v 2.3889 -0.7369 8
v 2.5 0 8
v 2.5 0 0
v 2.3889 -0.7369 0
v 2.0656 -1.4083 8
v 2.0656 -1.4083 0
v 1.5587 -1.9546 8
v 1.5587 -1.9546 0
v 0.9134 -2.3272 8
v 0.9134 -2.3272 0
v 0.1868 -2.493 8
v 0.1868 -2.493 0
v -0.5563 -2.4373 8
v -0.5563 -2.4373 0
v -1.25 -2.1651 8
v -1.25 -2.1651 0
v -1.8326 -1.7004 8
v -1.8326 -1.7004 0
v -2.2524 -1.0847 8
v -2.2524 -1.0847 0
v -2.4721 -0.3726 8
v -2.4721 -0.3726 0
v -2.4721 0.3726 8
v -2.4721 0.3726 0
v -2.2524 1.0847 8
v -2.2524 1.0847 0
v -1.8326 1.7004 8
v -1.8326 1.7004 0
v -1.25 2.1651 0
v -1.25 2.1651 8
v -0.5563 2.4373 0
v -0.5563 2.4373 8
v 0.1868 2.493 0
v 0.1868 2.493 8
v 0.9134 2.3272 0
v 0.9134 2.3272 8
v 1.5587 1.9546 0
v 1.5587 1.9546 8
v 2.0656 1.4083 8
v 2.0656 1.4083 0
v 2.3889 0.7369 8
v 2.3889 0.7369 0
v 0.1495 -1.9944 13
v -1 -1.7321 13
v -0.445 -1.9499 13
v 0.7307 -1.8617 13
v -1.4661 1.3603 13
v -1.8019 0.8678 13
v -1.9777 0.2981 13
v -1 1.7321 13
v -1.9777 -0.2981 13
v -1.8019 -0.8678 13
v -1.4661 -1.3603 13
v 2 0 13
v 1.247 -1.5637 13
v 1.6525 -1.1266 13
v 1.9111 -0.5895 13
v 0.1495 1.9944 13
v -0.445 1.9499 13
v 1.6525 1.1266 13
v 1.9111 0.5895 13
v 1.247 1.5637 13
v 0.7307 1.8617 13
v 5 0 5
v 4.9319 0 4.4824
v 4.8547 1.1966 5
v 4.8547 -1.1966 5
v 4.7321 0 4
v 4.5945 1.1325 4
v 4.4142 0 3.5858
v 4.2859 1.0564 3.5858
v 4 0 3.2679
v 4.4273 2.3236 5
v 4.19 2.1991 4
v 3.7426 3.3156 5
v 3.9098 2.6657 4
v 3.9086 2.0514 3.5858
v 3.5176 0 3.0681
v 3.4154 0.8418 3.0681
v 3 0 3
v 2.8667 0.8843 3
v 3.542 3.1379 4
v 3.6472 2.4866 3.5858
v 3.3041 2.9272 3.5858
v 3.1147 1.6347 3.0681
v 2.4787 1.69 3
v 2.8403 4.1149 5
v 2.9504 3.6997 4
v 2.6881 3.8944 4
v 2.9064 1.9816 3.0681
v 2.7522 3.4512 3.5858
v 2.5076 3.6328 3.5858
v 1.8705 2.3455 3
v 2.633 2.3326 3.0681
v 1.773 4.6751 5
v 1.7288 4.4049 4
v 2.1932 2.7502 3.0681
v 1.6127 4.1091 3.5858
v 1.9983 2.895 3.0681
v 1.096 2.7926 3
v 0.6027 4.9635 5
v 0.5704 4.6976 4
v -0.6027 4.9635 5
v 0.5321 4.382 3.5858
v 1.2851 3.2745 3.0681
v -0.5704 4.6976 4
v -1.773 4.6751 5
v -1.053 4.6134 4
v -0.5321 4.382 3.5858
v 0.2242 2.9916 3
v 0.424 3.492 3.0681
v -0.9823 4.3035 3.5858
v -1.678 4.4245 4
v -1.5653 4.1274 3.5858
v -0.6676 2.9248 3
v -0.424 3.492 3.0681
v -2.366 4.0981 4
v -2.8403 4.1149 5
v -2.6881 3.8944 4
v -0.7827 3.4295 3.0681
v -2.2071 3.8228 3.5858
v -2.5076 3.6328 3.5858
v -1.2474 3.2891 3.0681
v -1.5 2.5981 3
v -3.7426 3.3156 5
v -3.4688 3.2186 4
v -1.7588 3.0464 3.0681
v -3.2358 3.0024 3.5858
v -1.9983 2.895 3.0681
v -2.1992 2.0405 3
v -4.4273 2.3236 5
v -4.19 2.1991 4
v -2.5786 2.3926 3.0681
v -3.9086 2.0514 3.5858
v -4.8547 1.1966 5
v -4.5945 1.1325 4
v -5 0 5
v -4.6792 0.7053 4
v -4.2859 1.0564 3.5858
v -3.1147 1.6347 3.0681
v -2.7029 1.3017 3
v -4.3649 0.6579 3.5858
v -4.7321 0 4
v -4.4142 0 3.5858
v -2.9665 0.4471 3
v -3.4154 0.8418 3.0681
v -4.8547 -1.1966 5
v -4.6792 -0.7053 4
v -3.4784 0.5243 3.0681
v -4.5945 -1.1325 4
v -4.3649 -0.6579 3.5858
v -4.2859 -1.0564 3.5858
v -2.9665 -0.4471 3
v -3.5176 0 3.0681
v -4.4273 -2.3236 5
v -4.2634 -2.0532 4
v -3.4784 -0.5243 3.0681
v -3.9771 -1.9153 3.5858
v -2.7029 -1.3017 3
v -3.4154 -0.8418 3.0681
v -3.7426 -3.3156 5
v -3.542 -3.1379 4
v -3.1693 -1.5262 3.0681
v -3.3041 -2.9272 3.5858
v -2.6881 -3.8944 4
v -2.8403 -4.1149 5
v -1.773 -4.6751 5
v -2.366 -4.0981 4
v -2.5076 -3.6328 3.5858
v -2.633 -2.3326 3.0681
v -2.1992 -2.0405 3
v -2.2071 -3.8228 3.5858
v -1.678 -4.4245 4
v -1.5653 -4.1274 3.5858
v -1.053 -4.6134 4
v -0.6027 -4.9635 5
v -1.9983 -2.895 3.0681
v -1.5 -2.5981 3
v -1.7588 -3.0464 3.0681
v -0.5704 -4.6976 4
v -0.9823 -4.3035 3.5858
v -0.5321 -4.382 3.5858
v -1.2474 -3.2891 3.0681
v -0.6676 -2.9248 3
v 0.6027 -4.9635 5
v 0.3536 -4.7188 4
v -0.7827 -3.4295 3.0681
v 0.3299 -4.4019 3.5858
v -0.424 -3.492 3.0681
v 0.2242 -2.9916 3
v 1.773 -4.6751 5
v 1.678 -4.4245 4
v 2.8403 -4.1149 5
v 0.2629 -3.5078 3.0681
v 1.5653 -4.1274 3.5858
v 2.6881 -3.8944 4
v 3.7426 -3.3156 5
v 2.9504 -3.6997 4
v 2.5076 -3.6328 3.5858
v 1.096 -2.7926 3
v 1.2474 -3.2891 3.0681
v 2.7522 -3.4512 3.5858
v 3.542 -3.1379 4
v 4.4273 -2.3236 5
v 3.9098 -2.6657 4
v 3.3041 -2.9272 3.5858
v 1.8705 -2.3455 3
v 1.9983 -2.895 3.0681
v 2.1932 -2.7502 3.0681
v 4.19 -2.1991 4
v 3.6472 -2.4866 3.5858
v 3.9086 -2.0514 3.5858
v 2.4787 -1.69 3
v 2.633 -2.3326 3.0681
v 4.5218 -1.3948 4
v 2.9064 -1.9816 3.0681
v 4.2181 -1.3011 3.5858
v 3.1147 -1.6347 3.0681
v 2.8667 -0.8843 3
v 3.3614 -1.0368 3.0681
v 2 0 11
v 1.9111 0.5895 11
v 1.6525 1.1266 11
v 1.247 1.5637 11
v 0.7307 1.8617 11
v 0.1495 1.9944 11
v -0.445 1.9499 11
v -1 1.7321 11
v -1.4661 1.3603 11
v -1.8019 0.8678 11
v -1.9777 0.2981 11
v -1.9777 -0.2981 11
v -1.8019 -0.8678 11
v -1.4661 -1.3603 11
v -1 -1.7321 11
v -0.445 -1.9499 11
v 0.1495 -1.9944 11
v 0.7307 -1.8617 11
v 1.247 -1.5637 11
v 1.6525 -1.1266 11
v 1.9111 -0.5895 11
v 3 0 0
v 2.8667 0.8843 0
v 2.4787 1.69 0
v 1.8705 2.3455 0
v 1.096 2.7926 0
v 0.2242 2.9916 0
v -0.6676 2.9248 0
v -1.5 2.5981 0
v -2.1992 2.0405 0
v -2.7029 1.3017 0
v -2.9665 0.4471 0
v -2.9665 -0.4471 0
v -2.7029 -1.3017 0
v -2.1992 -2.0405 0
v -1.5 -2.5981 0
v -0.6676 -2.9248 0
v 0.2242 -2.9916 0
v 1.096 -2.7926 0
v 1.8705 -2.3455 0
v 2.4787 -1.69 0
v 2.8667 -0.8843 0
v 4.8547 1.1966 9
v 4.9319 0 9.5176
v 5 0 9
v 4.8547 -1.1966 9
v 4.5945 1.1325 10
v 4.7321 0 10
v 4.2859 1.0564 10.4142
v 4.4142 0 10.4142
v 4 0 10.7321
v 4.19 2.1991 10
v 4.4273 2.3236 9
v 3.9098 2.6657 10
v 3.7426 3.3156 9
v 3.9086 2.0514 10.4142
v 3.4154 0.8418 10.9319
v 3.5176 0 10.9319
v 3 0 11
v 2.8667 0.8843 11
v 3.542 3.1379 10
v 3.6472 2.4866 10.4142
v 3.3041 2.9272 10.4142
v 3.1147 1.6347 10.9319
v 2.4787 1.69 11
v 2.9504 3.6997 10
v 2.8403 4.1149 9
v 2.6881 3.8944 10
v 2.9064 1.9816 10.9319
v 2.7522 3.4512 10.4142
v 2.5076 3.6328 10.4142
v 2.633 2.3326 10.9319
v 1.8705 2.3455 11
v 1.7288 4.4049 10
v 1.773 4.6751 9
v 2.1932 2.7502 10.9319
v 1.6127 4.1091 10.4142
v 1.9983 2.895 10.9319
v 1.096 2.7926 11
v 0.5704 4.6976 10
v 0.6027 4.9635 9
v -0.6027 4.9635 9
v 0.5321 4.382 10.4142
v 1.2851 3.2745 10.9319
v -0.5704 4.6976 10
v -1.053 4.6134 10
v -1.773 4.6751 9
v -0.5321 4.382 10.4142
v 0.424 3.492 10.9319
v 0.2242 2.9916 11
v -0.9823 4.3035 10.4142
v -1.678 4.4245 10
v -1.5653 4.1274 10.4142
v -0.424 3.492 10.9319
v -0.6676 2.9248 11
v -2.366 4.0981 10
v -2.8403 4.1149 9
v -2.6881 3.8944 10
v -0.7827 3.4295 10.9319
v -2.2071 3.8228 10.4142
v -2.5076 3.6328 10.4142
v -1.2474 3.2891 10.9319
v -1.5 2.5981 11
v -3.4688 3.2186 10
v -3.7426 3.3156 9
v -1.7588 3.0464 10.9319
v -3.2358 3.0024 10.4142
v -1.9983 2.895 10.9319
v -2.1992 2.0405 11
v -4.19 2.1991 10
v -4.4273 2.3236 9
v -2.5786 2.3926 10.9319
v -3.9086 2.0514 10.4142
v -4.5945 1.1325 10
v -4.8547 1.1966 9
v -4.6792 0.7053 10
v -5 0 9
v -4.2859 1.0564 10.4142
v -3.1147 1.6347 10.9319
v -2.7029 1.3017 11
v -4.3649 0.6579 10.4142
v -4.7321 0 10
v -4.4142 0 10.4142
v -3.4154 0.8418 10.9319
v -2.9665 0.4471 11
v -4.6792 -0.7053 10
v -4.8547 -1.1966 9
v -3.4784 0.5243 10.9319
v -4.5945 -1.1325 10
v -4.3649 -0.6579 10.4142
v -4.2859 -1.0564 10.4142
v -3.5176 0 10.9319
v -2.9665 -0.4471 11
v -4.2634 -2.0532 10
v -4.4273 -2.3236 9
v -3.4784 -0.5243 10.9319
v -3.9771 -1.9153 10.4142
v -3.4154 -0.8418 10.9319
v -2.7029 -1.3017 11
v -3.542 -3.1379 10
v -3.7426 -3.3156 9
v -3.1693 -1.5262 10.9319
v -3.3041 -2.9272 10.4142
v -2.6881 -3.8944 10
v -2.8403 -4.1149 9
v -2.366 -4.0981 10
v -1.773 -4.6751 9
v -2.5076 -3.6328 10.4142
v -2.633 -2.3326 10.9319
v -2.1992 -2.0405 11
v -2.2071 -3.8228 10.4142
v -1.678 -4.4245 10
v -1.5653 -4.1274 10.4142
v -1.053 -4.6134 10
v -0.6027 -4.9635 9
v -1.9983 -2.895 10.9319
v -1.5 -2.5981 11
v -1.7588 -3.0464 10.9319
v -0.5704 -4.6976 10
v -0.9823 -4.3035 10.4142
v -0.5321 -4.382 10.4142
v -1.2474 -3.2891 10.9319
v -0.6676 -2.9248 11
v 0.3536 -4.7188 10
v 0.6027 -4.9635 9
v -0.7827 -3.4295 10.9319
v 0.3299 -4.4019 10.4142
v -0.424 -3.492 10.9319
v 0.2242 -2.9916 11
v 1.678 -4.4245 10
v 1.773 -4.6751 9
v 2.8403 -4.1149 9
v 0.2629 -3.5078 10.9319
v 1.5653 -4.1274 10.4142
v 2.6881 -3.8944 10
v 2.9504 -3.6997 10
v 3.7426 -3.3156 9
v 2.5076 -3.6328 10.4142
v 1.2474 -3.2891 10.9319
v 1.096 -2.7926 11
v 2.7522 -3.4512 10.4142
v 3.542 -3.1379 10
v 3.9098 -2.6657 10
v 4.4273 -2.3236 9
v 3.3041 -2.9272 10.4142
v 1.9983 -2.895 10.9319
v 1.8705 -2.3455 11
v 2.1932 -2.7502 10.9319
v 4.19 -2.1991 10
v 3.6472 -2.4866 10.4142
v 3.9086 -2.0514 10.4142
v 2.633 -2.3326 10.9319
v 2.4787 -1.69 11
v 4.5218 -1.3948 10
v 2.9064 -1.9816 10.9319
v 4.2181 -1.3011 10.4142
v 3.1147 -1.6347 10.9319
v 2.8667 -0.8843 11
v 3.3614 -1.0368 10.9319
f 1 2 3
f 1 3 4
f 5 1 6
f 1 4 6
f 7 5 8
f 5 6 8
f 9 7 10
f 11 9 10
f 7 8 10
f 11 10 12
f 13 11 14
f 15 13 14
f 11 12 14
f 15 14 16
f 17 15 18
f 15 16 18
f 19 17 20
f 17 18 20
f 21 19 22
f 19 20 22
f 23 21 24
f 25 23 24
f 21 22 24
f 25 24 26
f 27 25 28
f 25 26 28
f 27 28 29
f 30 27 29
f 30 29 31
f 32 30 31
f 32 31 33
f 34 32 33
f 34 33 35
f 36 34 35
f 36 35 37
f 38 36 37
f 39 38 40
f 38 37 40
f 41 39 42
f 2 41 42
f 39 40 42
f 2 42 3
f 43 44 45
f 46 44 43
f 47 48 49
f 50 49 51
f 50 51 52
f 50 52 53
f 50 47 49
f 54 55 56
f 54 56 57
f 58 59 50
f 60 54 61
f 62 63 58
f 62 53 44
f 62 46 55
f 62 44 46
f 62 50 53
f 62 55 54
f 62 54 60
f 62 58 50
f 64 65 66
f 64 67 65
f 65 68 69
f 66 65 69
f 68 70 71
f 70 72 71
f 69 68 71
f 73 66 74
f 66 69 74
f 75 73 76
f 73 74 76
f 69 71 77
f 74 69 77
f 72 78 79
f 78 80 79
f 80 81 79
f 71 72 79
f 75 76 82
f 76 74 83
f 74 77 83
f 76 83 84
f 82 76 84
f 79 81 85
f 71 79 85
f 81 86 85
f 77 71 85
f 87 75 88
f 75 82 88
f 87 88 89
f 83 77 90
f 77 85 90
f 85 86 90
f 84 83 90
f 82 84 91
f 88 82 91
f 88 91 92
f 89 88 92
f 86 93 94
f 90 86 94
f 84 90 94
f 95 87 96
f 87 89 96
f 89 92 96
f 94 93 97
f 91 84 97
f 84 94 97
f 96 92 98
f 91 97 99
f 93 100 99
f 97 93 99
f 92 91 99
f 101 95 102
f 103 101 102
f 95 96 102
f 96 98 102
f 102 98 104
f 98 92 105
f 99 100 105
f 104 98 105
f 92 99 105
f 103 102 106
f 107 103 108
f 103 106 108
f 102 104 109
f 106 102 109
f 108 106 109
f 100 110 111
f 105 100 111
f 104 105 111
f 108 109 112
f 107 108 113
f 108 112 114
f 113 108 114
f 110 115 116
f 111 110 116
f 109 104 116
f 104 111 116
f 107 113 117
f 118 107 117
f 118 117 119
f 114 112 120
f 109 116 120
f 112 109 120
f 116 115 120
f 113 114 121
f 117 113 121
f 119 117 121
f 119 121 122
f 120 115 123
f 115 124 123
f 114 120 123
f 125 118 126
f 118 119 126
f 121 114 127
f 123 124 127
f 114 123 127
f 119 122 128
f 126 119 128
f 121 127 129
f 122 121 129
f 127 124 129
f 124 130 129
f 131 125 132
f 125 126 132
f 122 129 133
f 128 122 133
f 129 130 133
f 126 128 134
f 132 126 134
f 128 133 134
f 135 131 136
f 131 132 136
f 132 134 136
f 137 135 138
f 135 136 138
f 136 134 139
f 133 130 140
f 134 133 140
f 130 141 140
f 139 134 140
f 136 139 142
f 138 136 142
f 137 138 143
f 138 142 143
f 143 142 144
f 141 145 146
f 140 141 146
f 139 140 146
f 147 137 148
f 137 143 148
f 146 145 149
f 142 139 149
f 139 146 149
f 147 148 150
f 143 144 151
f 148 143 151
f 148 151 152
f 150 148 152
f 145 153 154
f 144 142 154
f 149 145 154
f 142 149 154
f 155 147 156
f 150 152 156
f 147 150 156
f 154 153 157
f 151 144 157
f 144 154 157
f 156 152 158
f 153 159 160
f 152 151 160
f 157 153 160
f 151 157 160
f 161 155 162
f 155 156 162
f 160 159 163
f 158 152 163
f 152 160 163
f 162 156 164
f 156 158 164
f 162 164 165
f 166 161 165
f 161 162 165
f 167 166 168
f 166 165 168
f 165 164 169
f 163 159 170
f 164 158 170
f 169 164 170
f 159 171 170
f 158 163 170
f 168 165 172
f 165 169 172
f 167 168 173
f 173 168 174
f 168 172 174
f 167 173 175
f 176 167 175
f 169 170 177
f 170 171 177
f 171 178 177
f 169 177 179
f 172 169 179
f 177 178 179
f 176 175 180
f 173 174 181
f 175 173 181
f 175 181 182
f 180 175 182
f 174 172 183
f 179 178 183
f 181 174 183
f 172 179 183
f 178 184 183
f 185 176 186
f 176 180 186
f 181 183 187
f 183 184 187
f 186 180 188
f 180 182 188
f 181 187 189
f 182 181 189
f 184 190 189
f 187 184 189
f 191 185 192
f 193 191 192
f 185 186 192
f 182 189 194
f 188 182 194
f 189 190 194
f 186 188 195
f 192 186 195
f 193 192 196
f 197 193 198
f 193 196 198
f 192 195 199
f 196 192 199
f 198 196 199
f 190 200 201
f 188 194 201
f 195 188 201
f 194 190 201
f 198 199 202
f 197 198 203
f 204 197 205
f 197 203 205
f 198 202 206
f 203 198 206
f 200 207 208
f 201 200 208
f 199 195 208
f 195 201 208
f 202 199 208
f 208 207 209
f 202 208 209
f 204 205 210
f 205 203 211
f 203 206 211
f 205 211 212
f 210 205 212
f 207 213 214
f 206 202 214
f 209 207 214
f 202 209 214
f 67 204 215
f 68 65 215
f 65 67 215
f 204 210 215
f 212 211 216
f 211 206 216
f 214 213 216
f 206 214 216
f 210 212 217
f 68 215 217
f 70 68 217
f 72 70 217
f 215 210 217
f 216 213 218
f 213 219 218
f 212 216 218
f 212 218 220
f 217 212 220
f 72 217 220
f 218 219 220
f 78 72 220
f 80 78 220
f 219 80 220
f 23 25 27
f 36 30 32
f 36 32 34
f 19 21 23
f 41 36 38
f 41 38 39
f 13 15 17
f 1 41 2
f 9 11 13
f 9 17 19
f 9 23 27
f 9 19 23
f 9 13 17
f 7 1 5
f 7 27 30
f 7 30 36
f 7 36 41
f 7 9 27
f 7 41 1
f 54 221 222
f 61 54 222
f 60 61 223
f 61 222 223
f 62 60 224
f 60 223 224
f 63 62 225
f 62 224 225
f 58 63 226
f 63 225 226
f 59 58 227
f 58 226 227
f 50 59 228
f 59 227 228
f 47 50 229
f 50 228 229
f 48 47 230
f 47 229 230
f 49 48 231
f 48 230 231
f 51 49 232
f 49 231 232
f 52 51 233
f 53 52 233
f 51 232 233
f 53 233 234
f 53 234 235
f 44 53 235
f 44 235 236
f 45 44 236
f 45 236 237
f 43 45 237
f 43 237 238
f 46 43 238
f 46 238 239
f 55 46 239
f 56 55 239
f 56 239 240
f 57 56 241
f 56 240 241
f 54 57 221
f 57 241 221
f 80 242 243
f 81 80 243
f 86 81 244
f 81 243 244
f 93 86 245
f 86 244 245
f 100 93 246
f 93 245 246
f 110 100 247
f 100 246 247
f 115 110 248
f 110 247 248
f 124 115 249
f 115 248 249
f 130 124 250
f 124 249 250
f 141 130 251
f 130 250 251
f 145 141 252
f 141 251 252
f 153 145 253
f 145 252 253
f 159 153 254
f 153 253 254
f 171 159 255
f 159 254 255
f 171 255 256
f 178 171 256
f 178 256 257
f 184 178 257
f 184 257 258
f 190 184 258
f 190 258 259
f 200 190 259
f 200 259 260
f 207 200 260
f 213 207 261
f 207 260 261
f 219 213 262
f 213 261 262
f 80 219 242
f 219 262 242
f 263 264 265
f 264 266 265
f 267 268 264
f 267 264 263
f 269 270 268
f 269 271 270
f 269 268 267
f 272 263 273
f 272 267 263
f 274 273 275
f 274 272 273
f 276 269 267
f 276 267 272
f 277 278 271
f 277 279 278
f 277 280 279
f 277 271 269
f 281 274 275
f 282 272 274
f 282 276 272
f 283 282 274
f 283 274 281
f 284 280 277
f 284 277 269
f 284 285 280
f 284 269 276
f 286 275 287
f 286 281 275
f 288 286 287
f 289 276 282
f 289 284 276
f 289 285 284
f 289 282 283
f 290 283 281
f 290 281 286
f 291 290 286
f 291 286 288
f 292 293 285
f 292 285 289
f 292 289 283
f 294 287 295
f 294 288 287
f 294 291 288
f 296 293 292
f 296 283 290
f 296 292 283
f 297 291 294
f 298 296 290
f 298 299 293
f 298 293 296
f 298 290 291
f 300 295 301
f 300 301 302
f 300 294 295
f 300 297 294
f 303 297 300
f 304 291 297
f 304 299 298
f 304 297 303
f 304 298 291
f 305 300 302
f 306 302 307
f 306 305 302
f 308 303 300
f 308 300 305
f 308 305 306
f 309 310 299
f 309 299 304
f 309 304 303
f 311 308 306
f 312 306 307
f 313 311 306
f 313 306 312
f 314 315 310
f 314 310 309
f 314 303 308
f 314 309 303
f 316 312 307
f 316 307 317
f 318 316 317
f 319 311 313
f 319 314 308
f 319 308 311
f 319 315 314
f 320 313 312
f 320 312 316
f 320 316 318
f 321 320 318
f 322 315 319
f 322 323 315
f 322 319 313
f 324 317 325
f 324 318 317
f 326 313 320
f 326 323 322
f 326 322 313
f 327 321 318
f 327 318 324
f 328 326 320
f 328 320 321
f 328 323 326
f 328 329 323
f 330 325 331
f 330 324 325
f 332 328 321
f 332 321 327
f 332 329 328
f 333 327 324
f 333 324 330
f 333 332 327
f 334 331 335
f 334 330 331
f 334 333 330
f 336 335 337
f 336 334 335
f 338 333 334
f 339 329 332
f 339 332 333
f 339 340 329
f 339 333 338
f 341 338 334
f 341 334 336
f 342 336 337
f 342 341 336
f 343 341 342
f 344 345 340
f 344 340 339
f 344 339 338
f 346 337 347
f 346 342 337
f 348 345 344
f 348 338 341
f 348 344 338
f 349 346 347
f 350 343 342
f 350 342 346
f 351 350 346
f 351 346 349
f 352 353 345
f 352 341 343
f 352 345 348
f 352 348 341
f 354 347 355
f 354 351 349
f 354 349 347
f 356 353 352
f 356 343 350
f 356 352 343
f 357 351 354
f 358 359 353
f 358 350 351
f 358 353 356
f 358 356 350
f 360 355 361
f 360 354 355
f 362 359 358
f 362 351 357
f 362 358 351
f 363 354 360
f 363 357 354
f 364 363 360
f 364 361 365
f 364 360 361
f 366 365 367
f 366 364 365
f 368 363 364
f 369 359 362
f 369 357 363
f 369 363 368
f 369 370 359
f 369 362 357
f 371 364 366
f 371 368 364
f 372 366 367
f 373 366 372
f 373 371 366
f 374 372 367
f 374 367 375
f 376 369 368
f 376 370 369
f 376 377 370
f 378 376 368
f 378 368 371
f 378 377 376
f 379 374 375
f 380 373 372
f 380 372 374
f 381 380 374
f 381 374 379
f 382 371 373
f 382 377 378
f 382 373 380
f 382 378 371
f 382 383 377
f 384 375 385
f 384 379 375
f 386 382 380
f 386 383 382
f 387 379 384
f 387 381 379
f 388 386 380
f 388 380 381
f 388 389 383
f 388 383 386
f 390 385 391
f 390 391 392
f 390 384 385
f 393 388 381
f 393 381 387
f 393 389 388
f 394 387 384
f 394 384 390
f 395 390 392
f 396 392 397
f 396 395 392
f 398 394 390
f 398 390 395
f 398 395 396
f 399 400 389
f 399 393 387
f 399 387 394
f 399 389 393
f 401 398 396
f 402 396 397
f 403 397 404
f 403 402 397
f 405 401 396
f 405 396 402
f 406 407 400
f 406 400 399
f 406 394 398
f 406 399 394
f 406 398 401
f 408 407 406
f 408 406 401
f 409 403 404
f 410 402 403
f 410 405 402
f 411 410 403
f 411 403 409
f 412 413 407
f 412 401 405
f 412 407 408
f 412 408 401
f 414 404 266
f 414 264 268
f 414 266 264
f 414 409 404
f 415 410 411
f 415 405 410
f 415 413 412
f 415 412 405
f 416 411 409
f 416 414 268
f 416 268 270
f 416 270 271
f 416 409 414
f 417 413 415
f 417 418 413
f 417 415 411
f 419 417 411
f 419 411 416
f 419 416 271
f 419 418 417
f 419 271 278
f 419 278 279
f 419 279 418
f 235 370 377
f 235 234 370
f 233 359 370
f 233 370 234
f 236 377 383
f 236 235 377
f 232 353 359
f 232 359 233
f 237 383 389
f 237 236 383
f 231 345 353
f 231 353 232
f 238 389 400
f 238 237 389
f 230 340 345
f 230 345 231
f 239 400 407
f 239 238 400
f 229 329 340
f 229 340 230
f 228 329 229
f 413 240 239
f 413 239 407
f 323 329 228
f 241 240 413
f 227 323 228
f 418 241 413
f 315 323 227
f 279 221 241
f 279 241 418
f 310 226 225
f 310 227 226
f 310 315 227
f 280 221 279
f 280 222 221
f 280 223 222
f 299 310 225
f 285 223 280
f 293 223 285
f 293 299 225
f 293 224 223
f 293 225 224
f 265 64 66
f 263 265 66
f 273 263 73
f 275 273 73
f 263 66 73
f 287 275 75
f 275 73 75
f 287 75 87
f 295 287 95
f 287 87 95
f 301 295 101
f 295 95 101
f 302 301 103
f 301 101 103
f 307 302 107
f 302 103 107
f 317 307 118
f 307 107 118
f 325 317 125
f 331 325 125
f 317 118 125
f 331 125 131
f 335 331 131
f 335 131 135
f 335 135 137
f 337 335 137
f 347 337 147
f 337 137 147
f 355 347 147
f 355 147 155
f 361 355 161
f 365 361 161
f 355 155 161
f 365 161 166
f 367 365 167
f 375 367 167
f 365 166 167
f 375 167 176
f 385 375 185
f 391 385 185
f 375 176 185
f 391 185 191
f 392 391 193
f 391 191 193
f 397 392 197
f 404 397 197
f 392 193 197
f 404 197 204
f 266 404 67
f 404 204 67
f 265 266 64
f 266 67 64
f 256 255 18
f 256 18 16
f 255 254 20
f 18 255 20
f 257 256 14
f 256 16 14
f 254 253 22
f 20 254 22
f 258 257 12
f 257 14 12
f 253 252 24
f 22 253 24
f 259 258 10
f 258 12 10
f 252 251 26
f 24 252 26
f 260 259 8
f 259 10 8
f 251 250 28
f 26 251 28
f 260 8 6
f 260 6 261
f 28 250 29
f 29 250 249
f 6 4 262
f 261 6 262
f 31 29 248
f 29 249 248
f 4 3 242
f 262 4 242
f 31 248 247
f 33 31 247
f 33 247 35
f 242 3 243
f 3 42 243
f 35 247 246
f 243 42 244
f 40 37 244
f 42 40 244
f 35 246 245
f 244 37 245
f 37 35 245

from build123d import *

# Parameters (mm, degrees)
F0_R     = 3
F1_DEPTH = 3
F2_R     = 5
F3_DEPTH = 8
F4_R     = 2
F5_DEPTH = 2
F6_R     = 1.99999
F7_R     = 2.5
F8_DEPTH = 8


# Not quite as in the source:
# - a fillet or chamfer is up to 0.001 mm smaller than in the source, because OpenCascade refuses the exact size


with BuildPart() as f1:
    # F0 (on Top) → F1 (new body)
    with BuildSketch(Plane.XY):
        Circle(F0_R)
    extrude(amount=F1_DEPTH)

    # F2 (on face) → F3 (join)
    with BuildSketch(Plane.XY.offset(3)):
        Circle(F2_R)
    extrude(amount=F3_DEPTH)

    # F4 (on face) → F5 (join)
    with BuildSketch(Plane.XY.offset(11)):
        Circle(F4_R)
    extrude(amount=F5_DEPTH)

    # F6 (radius 2 in the source; OpenCascade refuses exactly that, so slightly less here)
    f6_edges = [f1.edges().sort_by_distance(p)[0] for p in [
        (-5, 0, 11),
        (-5, 0, 3),
    ]]
    fillet(f6_edges, radius=F6_R)

    # F7 (on face) → F8 (cut)
    with BuildSketch(Plane(origin=(0, 0, 0), x_dir=(1, 0, 0), z_dir=(0, 0, -1))):
        Circle(F7_R)
    extrude(amount=-F8_DEPTH, mode=Mode.SUBTRACT)


solid = f1.part
